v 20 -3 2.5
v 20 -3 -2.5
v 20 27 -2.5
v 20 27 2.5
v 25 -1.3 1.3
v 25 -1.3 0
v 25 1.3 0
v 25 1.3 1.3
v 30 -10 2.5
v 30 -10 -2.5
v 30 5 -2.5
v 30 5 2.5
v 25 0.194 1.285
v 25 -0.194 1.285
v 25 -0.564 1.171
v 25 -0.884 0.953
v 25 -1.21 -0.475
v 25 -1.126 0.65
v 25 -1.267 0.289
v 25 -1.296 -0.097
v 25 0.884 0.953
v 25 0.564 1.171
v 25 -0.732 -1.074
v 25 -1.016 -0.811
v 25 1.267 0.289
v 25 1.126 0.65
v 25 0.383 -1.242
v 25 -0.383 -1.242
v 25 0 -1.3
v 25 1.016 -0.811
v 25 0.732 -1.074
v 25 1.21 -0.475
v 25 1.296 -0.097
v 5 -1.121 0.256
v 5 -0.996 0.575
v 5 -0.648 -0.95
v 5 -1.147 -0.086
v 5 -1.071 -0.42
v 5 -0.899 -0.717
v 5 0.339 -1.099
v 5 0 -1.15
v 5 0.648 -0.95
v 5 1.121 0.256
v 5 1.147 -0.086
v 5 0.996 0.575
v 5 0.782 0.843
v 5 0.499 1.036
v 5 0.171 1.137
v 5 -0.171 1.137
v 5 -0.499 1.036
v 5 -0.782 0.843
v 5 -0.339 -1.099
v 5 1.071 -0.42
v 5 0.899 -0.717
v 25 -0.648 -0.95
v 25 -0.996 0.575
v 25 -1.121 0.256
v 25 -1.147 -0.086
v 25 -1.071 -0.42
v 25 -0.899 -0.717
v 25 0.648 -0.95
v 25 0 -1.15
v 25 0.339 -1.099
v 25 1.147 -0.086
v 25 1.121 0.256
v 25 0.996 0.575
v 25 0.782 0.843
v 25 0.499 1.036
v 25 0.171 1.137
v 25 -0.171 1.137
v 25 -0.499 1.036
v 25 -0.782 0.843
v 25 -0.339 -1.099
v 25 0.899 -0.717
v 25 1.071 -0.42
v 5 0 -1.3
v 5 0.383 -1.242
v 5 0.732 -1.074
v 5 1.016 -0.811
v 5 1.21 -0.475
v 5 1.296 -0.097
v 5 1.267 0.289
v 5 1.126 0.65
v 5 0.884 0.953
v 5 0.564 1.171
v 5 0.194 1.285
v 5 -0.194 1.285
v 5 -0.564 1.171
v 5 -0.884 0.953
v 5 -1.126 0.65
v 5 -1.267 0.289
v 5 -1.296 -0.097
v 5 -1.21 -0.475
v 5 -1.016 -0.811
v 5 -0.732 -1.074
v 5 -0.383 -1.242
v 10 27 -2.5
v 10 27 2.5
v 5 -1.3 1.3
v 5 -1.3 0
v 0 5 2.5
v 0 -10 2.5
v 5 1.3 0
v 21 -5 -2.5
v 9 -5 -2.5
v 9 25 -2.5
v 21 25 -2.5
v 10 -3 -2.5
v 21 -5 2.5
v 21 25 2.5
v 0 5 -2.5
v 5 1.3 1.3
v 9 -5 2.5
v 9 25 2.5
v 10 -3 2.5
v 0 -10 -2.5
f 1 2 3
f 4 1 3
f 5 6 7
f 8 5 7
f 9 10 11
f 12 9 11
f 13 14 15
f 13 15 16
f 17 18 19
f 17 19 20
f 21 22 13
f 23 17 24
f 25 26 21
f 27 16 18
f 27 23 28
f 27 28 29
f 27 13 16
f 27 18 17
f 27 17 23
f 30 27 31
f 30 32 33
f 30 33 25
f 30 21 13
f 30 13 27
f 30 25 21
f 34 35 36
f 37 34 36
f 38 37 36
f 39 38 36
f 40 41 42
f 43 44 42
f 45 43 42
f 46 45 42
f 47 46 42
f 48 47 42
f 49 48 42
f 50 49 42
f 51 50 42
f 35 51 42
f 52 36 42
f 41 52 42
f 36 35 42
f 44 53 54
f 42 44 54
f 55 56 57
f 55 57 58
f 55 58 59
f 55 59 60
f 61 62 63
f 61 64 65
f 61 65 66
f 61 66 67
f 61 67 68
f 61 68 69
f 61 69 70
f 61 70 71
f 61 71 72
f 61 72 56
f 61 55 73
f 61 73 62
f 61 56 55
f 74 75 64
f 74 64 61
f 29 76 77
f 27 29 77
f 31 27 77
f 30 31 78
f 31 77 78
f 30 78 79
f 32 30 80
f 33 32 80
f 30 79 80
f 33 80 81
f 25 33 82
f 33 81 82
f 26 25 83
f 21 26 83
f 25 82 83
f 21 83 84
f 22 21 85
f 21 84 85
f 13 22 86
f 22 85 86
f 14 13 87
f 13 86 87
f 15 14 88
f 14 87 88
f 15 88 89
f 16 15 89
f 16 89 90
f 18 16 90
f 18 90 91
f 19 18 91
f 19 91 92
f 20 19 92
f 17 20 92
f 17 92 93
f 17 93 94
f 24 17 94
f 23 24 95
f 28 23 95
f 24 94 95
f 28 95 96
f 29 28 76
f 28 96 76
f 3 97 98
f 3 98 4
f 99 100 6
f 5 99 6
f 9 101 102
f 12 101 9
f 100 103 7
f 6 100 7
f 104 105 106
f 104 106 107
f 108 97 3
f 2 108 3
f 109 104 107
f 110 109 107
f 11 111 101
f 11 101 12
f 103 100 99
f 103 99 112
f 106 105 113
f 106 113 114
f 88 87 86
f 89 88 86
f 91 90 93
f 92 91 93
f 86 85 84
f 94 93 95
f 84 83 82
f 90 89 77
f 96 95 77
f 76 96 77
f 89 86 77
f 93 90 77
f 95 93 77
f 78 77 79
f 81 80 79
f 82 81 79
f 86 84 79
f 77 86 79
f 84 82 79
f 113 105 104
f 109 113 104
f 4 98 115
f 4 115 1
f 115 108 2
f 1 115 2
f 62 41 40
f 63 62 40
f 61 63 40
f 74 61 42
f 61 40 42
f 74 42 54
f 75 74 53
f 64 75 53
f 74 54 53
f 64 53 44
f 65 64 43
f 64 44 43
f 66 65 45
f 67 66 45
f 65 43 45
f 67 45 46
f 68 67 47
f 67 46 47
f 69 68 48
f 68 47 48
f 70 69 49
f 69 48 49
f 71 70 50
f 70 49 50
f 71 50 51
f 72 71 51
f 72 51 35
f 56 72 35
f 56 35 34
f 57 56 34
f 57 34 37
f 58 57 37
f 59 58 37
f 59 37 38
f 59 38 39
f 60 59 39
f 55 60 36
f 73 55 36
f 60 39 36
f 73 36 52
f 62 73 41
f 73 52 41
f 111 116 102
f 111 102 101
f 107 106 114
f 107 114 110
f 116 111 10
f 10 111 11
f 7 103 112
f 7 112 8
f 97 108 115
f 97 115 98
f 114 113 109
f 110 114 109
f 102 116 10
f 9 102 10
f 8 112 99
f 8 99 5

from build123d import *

# Parameters (mm, degrees)
BOX_W             = 30
BOX_H             = 15
BOX_DEPTH         = 5
BOX001_W          = 10
BOX001_H          = 30
BOX001_DEPTH      = 5
CYLINDER_R        = 1.15
CYLINDER_DEPTH    = 20
CYLINDER001_R     = 1.3
CYLINDER001_DEPTH = 20
BOX002_W          = 20
BOX002_H          = 2.6
BOX002_DEPTH      = 1.3
BOX003_W          = 12
BOX003_H          = 30
BOX003_DEPTH      = 5


with BuildPart() as cube:
    # Box → Box (new body)
    with BuildSketch(Plane(origin=(0, -10, -2.5), x_dir=(1, 0, 0), z_dir=(0, 0, 1))):
        with Locations((15, 7.5)):
            Rectangle(BOX_W, BOX_H)
    extrude(amount=BOX_DEPTH)


with BuildPart() as cube001:
    # Box001 → Box001 (new body)
    with BuildSketch(Plane(origin=(10, -3, -2.5), x_dir=(1, 0, 0), z_dir=(0, 0, 1))):
        with Locations((5, 15)):
            Rectangle(BOX001_W, BOX001_H)
    extrude(amount=BOX001_DEPTH)


with BuildPart() as cylinder:
    # Cylinder → Cylinder (new body)
    with BuildSketch(Plane(origin=(5, 0, 0), x_dir=(0, 0, -1), z_dir=(1, 0, 0))):
        Circle(CYLINDER_R)
    extrude(amount=CYLINDER_DEPTH)


with BuildPart() as cylinder001:
    # Cylinder001 → Cylinder001 (new body)
    with BuildSketch(Plane(origin=(5, 0, 0), x_dir=(0, 0, -1), z_dir=(1, 0, 0))):
        Circle(CYLINDER001_R)
    extrude(amount=CYLINDER001_DEPTH)


with BuildPart() as cube002:
    # Box002 → Box002 (new body)
    with BuildSketch(Plane(origin=(5, -1.3, 0), x_dir=(1, 0, 0), z_dir=(0, 0, 1))):
        with Locations((10, 1.3)):
            Rectangle(BOX002_W, BOX002_H)
    extrude(amount=BOX002_DEPTH)


with BuildPart() as cube003:
    # Box003 → Box003 (new body)
    with BuildSketch(Plane(origin=(9, -5, -2.5), x_dir=(1, 0, 0), z_dir=(0, 0, 1))):
        with Locations((6, 15)):
            Rectangle(BOX003_W, BOX003_H)
    extrude(amount=BOX003_DEPTH)


solid = Compound([cube.part, cube001.part, cylinder.part, cylinder001.part, cube002.part, cube003.part])
